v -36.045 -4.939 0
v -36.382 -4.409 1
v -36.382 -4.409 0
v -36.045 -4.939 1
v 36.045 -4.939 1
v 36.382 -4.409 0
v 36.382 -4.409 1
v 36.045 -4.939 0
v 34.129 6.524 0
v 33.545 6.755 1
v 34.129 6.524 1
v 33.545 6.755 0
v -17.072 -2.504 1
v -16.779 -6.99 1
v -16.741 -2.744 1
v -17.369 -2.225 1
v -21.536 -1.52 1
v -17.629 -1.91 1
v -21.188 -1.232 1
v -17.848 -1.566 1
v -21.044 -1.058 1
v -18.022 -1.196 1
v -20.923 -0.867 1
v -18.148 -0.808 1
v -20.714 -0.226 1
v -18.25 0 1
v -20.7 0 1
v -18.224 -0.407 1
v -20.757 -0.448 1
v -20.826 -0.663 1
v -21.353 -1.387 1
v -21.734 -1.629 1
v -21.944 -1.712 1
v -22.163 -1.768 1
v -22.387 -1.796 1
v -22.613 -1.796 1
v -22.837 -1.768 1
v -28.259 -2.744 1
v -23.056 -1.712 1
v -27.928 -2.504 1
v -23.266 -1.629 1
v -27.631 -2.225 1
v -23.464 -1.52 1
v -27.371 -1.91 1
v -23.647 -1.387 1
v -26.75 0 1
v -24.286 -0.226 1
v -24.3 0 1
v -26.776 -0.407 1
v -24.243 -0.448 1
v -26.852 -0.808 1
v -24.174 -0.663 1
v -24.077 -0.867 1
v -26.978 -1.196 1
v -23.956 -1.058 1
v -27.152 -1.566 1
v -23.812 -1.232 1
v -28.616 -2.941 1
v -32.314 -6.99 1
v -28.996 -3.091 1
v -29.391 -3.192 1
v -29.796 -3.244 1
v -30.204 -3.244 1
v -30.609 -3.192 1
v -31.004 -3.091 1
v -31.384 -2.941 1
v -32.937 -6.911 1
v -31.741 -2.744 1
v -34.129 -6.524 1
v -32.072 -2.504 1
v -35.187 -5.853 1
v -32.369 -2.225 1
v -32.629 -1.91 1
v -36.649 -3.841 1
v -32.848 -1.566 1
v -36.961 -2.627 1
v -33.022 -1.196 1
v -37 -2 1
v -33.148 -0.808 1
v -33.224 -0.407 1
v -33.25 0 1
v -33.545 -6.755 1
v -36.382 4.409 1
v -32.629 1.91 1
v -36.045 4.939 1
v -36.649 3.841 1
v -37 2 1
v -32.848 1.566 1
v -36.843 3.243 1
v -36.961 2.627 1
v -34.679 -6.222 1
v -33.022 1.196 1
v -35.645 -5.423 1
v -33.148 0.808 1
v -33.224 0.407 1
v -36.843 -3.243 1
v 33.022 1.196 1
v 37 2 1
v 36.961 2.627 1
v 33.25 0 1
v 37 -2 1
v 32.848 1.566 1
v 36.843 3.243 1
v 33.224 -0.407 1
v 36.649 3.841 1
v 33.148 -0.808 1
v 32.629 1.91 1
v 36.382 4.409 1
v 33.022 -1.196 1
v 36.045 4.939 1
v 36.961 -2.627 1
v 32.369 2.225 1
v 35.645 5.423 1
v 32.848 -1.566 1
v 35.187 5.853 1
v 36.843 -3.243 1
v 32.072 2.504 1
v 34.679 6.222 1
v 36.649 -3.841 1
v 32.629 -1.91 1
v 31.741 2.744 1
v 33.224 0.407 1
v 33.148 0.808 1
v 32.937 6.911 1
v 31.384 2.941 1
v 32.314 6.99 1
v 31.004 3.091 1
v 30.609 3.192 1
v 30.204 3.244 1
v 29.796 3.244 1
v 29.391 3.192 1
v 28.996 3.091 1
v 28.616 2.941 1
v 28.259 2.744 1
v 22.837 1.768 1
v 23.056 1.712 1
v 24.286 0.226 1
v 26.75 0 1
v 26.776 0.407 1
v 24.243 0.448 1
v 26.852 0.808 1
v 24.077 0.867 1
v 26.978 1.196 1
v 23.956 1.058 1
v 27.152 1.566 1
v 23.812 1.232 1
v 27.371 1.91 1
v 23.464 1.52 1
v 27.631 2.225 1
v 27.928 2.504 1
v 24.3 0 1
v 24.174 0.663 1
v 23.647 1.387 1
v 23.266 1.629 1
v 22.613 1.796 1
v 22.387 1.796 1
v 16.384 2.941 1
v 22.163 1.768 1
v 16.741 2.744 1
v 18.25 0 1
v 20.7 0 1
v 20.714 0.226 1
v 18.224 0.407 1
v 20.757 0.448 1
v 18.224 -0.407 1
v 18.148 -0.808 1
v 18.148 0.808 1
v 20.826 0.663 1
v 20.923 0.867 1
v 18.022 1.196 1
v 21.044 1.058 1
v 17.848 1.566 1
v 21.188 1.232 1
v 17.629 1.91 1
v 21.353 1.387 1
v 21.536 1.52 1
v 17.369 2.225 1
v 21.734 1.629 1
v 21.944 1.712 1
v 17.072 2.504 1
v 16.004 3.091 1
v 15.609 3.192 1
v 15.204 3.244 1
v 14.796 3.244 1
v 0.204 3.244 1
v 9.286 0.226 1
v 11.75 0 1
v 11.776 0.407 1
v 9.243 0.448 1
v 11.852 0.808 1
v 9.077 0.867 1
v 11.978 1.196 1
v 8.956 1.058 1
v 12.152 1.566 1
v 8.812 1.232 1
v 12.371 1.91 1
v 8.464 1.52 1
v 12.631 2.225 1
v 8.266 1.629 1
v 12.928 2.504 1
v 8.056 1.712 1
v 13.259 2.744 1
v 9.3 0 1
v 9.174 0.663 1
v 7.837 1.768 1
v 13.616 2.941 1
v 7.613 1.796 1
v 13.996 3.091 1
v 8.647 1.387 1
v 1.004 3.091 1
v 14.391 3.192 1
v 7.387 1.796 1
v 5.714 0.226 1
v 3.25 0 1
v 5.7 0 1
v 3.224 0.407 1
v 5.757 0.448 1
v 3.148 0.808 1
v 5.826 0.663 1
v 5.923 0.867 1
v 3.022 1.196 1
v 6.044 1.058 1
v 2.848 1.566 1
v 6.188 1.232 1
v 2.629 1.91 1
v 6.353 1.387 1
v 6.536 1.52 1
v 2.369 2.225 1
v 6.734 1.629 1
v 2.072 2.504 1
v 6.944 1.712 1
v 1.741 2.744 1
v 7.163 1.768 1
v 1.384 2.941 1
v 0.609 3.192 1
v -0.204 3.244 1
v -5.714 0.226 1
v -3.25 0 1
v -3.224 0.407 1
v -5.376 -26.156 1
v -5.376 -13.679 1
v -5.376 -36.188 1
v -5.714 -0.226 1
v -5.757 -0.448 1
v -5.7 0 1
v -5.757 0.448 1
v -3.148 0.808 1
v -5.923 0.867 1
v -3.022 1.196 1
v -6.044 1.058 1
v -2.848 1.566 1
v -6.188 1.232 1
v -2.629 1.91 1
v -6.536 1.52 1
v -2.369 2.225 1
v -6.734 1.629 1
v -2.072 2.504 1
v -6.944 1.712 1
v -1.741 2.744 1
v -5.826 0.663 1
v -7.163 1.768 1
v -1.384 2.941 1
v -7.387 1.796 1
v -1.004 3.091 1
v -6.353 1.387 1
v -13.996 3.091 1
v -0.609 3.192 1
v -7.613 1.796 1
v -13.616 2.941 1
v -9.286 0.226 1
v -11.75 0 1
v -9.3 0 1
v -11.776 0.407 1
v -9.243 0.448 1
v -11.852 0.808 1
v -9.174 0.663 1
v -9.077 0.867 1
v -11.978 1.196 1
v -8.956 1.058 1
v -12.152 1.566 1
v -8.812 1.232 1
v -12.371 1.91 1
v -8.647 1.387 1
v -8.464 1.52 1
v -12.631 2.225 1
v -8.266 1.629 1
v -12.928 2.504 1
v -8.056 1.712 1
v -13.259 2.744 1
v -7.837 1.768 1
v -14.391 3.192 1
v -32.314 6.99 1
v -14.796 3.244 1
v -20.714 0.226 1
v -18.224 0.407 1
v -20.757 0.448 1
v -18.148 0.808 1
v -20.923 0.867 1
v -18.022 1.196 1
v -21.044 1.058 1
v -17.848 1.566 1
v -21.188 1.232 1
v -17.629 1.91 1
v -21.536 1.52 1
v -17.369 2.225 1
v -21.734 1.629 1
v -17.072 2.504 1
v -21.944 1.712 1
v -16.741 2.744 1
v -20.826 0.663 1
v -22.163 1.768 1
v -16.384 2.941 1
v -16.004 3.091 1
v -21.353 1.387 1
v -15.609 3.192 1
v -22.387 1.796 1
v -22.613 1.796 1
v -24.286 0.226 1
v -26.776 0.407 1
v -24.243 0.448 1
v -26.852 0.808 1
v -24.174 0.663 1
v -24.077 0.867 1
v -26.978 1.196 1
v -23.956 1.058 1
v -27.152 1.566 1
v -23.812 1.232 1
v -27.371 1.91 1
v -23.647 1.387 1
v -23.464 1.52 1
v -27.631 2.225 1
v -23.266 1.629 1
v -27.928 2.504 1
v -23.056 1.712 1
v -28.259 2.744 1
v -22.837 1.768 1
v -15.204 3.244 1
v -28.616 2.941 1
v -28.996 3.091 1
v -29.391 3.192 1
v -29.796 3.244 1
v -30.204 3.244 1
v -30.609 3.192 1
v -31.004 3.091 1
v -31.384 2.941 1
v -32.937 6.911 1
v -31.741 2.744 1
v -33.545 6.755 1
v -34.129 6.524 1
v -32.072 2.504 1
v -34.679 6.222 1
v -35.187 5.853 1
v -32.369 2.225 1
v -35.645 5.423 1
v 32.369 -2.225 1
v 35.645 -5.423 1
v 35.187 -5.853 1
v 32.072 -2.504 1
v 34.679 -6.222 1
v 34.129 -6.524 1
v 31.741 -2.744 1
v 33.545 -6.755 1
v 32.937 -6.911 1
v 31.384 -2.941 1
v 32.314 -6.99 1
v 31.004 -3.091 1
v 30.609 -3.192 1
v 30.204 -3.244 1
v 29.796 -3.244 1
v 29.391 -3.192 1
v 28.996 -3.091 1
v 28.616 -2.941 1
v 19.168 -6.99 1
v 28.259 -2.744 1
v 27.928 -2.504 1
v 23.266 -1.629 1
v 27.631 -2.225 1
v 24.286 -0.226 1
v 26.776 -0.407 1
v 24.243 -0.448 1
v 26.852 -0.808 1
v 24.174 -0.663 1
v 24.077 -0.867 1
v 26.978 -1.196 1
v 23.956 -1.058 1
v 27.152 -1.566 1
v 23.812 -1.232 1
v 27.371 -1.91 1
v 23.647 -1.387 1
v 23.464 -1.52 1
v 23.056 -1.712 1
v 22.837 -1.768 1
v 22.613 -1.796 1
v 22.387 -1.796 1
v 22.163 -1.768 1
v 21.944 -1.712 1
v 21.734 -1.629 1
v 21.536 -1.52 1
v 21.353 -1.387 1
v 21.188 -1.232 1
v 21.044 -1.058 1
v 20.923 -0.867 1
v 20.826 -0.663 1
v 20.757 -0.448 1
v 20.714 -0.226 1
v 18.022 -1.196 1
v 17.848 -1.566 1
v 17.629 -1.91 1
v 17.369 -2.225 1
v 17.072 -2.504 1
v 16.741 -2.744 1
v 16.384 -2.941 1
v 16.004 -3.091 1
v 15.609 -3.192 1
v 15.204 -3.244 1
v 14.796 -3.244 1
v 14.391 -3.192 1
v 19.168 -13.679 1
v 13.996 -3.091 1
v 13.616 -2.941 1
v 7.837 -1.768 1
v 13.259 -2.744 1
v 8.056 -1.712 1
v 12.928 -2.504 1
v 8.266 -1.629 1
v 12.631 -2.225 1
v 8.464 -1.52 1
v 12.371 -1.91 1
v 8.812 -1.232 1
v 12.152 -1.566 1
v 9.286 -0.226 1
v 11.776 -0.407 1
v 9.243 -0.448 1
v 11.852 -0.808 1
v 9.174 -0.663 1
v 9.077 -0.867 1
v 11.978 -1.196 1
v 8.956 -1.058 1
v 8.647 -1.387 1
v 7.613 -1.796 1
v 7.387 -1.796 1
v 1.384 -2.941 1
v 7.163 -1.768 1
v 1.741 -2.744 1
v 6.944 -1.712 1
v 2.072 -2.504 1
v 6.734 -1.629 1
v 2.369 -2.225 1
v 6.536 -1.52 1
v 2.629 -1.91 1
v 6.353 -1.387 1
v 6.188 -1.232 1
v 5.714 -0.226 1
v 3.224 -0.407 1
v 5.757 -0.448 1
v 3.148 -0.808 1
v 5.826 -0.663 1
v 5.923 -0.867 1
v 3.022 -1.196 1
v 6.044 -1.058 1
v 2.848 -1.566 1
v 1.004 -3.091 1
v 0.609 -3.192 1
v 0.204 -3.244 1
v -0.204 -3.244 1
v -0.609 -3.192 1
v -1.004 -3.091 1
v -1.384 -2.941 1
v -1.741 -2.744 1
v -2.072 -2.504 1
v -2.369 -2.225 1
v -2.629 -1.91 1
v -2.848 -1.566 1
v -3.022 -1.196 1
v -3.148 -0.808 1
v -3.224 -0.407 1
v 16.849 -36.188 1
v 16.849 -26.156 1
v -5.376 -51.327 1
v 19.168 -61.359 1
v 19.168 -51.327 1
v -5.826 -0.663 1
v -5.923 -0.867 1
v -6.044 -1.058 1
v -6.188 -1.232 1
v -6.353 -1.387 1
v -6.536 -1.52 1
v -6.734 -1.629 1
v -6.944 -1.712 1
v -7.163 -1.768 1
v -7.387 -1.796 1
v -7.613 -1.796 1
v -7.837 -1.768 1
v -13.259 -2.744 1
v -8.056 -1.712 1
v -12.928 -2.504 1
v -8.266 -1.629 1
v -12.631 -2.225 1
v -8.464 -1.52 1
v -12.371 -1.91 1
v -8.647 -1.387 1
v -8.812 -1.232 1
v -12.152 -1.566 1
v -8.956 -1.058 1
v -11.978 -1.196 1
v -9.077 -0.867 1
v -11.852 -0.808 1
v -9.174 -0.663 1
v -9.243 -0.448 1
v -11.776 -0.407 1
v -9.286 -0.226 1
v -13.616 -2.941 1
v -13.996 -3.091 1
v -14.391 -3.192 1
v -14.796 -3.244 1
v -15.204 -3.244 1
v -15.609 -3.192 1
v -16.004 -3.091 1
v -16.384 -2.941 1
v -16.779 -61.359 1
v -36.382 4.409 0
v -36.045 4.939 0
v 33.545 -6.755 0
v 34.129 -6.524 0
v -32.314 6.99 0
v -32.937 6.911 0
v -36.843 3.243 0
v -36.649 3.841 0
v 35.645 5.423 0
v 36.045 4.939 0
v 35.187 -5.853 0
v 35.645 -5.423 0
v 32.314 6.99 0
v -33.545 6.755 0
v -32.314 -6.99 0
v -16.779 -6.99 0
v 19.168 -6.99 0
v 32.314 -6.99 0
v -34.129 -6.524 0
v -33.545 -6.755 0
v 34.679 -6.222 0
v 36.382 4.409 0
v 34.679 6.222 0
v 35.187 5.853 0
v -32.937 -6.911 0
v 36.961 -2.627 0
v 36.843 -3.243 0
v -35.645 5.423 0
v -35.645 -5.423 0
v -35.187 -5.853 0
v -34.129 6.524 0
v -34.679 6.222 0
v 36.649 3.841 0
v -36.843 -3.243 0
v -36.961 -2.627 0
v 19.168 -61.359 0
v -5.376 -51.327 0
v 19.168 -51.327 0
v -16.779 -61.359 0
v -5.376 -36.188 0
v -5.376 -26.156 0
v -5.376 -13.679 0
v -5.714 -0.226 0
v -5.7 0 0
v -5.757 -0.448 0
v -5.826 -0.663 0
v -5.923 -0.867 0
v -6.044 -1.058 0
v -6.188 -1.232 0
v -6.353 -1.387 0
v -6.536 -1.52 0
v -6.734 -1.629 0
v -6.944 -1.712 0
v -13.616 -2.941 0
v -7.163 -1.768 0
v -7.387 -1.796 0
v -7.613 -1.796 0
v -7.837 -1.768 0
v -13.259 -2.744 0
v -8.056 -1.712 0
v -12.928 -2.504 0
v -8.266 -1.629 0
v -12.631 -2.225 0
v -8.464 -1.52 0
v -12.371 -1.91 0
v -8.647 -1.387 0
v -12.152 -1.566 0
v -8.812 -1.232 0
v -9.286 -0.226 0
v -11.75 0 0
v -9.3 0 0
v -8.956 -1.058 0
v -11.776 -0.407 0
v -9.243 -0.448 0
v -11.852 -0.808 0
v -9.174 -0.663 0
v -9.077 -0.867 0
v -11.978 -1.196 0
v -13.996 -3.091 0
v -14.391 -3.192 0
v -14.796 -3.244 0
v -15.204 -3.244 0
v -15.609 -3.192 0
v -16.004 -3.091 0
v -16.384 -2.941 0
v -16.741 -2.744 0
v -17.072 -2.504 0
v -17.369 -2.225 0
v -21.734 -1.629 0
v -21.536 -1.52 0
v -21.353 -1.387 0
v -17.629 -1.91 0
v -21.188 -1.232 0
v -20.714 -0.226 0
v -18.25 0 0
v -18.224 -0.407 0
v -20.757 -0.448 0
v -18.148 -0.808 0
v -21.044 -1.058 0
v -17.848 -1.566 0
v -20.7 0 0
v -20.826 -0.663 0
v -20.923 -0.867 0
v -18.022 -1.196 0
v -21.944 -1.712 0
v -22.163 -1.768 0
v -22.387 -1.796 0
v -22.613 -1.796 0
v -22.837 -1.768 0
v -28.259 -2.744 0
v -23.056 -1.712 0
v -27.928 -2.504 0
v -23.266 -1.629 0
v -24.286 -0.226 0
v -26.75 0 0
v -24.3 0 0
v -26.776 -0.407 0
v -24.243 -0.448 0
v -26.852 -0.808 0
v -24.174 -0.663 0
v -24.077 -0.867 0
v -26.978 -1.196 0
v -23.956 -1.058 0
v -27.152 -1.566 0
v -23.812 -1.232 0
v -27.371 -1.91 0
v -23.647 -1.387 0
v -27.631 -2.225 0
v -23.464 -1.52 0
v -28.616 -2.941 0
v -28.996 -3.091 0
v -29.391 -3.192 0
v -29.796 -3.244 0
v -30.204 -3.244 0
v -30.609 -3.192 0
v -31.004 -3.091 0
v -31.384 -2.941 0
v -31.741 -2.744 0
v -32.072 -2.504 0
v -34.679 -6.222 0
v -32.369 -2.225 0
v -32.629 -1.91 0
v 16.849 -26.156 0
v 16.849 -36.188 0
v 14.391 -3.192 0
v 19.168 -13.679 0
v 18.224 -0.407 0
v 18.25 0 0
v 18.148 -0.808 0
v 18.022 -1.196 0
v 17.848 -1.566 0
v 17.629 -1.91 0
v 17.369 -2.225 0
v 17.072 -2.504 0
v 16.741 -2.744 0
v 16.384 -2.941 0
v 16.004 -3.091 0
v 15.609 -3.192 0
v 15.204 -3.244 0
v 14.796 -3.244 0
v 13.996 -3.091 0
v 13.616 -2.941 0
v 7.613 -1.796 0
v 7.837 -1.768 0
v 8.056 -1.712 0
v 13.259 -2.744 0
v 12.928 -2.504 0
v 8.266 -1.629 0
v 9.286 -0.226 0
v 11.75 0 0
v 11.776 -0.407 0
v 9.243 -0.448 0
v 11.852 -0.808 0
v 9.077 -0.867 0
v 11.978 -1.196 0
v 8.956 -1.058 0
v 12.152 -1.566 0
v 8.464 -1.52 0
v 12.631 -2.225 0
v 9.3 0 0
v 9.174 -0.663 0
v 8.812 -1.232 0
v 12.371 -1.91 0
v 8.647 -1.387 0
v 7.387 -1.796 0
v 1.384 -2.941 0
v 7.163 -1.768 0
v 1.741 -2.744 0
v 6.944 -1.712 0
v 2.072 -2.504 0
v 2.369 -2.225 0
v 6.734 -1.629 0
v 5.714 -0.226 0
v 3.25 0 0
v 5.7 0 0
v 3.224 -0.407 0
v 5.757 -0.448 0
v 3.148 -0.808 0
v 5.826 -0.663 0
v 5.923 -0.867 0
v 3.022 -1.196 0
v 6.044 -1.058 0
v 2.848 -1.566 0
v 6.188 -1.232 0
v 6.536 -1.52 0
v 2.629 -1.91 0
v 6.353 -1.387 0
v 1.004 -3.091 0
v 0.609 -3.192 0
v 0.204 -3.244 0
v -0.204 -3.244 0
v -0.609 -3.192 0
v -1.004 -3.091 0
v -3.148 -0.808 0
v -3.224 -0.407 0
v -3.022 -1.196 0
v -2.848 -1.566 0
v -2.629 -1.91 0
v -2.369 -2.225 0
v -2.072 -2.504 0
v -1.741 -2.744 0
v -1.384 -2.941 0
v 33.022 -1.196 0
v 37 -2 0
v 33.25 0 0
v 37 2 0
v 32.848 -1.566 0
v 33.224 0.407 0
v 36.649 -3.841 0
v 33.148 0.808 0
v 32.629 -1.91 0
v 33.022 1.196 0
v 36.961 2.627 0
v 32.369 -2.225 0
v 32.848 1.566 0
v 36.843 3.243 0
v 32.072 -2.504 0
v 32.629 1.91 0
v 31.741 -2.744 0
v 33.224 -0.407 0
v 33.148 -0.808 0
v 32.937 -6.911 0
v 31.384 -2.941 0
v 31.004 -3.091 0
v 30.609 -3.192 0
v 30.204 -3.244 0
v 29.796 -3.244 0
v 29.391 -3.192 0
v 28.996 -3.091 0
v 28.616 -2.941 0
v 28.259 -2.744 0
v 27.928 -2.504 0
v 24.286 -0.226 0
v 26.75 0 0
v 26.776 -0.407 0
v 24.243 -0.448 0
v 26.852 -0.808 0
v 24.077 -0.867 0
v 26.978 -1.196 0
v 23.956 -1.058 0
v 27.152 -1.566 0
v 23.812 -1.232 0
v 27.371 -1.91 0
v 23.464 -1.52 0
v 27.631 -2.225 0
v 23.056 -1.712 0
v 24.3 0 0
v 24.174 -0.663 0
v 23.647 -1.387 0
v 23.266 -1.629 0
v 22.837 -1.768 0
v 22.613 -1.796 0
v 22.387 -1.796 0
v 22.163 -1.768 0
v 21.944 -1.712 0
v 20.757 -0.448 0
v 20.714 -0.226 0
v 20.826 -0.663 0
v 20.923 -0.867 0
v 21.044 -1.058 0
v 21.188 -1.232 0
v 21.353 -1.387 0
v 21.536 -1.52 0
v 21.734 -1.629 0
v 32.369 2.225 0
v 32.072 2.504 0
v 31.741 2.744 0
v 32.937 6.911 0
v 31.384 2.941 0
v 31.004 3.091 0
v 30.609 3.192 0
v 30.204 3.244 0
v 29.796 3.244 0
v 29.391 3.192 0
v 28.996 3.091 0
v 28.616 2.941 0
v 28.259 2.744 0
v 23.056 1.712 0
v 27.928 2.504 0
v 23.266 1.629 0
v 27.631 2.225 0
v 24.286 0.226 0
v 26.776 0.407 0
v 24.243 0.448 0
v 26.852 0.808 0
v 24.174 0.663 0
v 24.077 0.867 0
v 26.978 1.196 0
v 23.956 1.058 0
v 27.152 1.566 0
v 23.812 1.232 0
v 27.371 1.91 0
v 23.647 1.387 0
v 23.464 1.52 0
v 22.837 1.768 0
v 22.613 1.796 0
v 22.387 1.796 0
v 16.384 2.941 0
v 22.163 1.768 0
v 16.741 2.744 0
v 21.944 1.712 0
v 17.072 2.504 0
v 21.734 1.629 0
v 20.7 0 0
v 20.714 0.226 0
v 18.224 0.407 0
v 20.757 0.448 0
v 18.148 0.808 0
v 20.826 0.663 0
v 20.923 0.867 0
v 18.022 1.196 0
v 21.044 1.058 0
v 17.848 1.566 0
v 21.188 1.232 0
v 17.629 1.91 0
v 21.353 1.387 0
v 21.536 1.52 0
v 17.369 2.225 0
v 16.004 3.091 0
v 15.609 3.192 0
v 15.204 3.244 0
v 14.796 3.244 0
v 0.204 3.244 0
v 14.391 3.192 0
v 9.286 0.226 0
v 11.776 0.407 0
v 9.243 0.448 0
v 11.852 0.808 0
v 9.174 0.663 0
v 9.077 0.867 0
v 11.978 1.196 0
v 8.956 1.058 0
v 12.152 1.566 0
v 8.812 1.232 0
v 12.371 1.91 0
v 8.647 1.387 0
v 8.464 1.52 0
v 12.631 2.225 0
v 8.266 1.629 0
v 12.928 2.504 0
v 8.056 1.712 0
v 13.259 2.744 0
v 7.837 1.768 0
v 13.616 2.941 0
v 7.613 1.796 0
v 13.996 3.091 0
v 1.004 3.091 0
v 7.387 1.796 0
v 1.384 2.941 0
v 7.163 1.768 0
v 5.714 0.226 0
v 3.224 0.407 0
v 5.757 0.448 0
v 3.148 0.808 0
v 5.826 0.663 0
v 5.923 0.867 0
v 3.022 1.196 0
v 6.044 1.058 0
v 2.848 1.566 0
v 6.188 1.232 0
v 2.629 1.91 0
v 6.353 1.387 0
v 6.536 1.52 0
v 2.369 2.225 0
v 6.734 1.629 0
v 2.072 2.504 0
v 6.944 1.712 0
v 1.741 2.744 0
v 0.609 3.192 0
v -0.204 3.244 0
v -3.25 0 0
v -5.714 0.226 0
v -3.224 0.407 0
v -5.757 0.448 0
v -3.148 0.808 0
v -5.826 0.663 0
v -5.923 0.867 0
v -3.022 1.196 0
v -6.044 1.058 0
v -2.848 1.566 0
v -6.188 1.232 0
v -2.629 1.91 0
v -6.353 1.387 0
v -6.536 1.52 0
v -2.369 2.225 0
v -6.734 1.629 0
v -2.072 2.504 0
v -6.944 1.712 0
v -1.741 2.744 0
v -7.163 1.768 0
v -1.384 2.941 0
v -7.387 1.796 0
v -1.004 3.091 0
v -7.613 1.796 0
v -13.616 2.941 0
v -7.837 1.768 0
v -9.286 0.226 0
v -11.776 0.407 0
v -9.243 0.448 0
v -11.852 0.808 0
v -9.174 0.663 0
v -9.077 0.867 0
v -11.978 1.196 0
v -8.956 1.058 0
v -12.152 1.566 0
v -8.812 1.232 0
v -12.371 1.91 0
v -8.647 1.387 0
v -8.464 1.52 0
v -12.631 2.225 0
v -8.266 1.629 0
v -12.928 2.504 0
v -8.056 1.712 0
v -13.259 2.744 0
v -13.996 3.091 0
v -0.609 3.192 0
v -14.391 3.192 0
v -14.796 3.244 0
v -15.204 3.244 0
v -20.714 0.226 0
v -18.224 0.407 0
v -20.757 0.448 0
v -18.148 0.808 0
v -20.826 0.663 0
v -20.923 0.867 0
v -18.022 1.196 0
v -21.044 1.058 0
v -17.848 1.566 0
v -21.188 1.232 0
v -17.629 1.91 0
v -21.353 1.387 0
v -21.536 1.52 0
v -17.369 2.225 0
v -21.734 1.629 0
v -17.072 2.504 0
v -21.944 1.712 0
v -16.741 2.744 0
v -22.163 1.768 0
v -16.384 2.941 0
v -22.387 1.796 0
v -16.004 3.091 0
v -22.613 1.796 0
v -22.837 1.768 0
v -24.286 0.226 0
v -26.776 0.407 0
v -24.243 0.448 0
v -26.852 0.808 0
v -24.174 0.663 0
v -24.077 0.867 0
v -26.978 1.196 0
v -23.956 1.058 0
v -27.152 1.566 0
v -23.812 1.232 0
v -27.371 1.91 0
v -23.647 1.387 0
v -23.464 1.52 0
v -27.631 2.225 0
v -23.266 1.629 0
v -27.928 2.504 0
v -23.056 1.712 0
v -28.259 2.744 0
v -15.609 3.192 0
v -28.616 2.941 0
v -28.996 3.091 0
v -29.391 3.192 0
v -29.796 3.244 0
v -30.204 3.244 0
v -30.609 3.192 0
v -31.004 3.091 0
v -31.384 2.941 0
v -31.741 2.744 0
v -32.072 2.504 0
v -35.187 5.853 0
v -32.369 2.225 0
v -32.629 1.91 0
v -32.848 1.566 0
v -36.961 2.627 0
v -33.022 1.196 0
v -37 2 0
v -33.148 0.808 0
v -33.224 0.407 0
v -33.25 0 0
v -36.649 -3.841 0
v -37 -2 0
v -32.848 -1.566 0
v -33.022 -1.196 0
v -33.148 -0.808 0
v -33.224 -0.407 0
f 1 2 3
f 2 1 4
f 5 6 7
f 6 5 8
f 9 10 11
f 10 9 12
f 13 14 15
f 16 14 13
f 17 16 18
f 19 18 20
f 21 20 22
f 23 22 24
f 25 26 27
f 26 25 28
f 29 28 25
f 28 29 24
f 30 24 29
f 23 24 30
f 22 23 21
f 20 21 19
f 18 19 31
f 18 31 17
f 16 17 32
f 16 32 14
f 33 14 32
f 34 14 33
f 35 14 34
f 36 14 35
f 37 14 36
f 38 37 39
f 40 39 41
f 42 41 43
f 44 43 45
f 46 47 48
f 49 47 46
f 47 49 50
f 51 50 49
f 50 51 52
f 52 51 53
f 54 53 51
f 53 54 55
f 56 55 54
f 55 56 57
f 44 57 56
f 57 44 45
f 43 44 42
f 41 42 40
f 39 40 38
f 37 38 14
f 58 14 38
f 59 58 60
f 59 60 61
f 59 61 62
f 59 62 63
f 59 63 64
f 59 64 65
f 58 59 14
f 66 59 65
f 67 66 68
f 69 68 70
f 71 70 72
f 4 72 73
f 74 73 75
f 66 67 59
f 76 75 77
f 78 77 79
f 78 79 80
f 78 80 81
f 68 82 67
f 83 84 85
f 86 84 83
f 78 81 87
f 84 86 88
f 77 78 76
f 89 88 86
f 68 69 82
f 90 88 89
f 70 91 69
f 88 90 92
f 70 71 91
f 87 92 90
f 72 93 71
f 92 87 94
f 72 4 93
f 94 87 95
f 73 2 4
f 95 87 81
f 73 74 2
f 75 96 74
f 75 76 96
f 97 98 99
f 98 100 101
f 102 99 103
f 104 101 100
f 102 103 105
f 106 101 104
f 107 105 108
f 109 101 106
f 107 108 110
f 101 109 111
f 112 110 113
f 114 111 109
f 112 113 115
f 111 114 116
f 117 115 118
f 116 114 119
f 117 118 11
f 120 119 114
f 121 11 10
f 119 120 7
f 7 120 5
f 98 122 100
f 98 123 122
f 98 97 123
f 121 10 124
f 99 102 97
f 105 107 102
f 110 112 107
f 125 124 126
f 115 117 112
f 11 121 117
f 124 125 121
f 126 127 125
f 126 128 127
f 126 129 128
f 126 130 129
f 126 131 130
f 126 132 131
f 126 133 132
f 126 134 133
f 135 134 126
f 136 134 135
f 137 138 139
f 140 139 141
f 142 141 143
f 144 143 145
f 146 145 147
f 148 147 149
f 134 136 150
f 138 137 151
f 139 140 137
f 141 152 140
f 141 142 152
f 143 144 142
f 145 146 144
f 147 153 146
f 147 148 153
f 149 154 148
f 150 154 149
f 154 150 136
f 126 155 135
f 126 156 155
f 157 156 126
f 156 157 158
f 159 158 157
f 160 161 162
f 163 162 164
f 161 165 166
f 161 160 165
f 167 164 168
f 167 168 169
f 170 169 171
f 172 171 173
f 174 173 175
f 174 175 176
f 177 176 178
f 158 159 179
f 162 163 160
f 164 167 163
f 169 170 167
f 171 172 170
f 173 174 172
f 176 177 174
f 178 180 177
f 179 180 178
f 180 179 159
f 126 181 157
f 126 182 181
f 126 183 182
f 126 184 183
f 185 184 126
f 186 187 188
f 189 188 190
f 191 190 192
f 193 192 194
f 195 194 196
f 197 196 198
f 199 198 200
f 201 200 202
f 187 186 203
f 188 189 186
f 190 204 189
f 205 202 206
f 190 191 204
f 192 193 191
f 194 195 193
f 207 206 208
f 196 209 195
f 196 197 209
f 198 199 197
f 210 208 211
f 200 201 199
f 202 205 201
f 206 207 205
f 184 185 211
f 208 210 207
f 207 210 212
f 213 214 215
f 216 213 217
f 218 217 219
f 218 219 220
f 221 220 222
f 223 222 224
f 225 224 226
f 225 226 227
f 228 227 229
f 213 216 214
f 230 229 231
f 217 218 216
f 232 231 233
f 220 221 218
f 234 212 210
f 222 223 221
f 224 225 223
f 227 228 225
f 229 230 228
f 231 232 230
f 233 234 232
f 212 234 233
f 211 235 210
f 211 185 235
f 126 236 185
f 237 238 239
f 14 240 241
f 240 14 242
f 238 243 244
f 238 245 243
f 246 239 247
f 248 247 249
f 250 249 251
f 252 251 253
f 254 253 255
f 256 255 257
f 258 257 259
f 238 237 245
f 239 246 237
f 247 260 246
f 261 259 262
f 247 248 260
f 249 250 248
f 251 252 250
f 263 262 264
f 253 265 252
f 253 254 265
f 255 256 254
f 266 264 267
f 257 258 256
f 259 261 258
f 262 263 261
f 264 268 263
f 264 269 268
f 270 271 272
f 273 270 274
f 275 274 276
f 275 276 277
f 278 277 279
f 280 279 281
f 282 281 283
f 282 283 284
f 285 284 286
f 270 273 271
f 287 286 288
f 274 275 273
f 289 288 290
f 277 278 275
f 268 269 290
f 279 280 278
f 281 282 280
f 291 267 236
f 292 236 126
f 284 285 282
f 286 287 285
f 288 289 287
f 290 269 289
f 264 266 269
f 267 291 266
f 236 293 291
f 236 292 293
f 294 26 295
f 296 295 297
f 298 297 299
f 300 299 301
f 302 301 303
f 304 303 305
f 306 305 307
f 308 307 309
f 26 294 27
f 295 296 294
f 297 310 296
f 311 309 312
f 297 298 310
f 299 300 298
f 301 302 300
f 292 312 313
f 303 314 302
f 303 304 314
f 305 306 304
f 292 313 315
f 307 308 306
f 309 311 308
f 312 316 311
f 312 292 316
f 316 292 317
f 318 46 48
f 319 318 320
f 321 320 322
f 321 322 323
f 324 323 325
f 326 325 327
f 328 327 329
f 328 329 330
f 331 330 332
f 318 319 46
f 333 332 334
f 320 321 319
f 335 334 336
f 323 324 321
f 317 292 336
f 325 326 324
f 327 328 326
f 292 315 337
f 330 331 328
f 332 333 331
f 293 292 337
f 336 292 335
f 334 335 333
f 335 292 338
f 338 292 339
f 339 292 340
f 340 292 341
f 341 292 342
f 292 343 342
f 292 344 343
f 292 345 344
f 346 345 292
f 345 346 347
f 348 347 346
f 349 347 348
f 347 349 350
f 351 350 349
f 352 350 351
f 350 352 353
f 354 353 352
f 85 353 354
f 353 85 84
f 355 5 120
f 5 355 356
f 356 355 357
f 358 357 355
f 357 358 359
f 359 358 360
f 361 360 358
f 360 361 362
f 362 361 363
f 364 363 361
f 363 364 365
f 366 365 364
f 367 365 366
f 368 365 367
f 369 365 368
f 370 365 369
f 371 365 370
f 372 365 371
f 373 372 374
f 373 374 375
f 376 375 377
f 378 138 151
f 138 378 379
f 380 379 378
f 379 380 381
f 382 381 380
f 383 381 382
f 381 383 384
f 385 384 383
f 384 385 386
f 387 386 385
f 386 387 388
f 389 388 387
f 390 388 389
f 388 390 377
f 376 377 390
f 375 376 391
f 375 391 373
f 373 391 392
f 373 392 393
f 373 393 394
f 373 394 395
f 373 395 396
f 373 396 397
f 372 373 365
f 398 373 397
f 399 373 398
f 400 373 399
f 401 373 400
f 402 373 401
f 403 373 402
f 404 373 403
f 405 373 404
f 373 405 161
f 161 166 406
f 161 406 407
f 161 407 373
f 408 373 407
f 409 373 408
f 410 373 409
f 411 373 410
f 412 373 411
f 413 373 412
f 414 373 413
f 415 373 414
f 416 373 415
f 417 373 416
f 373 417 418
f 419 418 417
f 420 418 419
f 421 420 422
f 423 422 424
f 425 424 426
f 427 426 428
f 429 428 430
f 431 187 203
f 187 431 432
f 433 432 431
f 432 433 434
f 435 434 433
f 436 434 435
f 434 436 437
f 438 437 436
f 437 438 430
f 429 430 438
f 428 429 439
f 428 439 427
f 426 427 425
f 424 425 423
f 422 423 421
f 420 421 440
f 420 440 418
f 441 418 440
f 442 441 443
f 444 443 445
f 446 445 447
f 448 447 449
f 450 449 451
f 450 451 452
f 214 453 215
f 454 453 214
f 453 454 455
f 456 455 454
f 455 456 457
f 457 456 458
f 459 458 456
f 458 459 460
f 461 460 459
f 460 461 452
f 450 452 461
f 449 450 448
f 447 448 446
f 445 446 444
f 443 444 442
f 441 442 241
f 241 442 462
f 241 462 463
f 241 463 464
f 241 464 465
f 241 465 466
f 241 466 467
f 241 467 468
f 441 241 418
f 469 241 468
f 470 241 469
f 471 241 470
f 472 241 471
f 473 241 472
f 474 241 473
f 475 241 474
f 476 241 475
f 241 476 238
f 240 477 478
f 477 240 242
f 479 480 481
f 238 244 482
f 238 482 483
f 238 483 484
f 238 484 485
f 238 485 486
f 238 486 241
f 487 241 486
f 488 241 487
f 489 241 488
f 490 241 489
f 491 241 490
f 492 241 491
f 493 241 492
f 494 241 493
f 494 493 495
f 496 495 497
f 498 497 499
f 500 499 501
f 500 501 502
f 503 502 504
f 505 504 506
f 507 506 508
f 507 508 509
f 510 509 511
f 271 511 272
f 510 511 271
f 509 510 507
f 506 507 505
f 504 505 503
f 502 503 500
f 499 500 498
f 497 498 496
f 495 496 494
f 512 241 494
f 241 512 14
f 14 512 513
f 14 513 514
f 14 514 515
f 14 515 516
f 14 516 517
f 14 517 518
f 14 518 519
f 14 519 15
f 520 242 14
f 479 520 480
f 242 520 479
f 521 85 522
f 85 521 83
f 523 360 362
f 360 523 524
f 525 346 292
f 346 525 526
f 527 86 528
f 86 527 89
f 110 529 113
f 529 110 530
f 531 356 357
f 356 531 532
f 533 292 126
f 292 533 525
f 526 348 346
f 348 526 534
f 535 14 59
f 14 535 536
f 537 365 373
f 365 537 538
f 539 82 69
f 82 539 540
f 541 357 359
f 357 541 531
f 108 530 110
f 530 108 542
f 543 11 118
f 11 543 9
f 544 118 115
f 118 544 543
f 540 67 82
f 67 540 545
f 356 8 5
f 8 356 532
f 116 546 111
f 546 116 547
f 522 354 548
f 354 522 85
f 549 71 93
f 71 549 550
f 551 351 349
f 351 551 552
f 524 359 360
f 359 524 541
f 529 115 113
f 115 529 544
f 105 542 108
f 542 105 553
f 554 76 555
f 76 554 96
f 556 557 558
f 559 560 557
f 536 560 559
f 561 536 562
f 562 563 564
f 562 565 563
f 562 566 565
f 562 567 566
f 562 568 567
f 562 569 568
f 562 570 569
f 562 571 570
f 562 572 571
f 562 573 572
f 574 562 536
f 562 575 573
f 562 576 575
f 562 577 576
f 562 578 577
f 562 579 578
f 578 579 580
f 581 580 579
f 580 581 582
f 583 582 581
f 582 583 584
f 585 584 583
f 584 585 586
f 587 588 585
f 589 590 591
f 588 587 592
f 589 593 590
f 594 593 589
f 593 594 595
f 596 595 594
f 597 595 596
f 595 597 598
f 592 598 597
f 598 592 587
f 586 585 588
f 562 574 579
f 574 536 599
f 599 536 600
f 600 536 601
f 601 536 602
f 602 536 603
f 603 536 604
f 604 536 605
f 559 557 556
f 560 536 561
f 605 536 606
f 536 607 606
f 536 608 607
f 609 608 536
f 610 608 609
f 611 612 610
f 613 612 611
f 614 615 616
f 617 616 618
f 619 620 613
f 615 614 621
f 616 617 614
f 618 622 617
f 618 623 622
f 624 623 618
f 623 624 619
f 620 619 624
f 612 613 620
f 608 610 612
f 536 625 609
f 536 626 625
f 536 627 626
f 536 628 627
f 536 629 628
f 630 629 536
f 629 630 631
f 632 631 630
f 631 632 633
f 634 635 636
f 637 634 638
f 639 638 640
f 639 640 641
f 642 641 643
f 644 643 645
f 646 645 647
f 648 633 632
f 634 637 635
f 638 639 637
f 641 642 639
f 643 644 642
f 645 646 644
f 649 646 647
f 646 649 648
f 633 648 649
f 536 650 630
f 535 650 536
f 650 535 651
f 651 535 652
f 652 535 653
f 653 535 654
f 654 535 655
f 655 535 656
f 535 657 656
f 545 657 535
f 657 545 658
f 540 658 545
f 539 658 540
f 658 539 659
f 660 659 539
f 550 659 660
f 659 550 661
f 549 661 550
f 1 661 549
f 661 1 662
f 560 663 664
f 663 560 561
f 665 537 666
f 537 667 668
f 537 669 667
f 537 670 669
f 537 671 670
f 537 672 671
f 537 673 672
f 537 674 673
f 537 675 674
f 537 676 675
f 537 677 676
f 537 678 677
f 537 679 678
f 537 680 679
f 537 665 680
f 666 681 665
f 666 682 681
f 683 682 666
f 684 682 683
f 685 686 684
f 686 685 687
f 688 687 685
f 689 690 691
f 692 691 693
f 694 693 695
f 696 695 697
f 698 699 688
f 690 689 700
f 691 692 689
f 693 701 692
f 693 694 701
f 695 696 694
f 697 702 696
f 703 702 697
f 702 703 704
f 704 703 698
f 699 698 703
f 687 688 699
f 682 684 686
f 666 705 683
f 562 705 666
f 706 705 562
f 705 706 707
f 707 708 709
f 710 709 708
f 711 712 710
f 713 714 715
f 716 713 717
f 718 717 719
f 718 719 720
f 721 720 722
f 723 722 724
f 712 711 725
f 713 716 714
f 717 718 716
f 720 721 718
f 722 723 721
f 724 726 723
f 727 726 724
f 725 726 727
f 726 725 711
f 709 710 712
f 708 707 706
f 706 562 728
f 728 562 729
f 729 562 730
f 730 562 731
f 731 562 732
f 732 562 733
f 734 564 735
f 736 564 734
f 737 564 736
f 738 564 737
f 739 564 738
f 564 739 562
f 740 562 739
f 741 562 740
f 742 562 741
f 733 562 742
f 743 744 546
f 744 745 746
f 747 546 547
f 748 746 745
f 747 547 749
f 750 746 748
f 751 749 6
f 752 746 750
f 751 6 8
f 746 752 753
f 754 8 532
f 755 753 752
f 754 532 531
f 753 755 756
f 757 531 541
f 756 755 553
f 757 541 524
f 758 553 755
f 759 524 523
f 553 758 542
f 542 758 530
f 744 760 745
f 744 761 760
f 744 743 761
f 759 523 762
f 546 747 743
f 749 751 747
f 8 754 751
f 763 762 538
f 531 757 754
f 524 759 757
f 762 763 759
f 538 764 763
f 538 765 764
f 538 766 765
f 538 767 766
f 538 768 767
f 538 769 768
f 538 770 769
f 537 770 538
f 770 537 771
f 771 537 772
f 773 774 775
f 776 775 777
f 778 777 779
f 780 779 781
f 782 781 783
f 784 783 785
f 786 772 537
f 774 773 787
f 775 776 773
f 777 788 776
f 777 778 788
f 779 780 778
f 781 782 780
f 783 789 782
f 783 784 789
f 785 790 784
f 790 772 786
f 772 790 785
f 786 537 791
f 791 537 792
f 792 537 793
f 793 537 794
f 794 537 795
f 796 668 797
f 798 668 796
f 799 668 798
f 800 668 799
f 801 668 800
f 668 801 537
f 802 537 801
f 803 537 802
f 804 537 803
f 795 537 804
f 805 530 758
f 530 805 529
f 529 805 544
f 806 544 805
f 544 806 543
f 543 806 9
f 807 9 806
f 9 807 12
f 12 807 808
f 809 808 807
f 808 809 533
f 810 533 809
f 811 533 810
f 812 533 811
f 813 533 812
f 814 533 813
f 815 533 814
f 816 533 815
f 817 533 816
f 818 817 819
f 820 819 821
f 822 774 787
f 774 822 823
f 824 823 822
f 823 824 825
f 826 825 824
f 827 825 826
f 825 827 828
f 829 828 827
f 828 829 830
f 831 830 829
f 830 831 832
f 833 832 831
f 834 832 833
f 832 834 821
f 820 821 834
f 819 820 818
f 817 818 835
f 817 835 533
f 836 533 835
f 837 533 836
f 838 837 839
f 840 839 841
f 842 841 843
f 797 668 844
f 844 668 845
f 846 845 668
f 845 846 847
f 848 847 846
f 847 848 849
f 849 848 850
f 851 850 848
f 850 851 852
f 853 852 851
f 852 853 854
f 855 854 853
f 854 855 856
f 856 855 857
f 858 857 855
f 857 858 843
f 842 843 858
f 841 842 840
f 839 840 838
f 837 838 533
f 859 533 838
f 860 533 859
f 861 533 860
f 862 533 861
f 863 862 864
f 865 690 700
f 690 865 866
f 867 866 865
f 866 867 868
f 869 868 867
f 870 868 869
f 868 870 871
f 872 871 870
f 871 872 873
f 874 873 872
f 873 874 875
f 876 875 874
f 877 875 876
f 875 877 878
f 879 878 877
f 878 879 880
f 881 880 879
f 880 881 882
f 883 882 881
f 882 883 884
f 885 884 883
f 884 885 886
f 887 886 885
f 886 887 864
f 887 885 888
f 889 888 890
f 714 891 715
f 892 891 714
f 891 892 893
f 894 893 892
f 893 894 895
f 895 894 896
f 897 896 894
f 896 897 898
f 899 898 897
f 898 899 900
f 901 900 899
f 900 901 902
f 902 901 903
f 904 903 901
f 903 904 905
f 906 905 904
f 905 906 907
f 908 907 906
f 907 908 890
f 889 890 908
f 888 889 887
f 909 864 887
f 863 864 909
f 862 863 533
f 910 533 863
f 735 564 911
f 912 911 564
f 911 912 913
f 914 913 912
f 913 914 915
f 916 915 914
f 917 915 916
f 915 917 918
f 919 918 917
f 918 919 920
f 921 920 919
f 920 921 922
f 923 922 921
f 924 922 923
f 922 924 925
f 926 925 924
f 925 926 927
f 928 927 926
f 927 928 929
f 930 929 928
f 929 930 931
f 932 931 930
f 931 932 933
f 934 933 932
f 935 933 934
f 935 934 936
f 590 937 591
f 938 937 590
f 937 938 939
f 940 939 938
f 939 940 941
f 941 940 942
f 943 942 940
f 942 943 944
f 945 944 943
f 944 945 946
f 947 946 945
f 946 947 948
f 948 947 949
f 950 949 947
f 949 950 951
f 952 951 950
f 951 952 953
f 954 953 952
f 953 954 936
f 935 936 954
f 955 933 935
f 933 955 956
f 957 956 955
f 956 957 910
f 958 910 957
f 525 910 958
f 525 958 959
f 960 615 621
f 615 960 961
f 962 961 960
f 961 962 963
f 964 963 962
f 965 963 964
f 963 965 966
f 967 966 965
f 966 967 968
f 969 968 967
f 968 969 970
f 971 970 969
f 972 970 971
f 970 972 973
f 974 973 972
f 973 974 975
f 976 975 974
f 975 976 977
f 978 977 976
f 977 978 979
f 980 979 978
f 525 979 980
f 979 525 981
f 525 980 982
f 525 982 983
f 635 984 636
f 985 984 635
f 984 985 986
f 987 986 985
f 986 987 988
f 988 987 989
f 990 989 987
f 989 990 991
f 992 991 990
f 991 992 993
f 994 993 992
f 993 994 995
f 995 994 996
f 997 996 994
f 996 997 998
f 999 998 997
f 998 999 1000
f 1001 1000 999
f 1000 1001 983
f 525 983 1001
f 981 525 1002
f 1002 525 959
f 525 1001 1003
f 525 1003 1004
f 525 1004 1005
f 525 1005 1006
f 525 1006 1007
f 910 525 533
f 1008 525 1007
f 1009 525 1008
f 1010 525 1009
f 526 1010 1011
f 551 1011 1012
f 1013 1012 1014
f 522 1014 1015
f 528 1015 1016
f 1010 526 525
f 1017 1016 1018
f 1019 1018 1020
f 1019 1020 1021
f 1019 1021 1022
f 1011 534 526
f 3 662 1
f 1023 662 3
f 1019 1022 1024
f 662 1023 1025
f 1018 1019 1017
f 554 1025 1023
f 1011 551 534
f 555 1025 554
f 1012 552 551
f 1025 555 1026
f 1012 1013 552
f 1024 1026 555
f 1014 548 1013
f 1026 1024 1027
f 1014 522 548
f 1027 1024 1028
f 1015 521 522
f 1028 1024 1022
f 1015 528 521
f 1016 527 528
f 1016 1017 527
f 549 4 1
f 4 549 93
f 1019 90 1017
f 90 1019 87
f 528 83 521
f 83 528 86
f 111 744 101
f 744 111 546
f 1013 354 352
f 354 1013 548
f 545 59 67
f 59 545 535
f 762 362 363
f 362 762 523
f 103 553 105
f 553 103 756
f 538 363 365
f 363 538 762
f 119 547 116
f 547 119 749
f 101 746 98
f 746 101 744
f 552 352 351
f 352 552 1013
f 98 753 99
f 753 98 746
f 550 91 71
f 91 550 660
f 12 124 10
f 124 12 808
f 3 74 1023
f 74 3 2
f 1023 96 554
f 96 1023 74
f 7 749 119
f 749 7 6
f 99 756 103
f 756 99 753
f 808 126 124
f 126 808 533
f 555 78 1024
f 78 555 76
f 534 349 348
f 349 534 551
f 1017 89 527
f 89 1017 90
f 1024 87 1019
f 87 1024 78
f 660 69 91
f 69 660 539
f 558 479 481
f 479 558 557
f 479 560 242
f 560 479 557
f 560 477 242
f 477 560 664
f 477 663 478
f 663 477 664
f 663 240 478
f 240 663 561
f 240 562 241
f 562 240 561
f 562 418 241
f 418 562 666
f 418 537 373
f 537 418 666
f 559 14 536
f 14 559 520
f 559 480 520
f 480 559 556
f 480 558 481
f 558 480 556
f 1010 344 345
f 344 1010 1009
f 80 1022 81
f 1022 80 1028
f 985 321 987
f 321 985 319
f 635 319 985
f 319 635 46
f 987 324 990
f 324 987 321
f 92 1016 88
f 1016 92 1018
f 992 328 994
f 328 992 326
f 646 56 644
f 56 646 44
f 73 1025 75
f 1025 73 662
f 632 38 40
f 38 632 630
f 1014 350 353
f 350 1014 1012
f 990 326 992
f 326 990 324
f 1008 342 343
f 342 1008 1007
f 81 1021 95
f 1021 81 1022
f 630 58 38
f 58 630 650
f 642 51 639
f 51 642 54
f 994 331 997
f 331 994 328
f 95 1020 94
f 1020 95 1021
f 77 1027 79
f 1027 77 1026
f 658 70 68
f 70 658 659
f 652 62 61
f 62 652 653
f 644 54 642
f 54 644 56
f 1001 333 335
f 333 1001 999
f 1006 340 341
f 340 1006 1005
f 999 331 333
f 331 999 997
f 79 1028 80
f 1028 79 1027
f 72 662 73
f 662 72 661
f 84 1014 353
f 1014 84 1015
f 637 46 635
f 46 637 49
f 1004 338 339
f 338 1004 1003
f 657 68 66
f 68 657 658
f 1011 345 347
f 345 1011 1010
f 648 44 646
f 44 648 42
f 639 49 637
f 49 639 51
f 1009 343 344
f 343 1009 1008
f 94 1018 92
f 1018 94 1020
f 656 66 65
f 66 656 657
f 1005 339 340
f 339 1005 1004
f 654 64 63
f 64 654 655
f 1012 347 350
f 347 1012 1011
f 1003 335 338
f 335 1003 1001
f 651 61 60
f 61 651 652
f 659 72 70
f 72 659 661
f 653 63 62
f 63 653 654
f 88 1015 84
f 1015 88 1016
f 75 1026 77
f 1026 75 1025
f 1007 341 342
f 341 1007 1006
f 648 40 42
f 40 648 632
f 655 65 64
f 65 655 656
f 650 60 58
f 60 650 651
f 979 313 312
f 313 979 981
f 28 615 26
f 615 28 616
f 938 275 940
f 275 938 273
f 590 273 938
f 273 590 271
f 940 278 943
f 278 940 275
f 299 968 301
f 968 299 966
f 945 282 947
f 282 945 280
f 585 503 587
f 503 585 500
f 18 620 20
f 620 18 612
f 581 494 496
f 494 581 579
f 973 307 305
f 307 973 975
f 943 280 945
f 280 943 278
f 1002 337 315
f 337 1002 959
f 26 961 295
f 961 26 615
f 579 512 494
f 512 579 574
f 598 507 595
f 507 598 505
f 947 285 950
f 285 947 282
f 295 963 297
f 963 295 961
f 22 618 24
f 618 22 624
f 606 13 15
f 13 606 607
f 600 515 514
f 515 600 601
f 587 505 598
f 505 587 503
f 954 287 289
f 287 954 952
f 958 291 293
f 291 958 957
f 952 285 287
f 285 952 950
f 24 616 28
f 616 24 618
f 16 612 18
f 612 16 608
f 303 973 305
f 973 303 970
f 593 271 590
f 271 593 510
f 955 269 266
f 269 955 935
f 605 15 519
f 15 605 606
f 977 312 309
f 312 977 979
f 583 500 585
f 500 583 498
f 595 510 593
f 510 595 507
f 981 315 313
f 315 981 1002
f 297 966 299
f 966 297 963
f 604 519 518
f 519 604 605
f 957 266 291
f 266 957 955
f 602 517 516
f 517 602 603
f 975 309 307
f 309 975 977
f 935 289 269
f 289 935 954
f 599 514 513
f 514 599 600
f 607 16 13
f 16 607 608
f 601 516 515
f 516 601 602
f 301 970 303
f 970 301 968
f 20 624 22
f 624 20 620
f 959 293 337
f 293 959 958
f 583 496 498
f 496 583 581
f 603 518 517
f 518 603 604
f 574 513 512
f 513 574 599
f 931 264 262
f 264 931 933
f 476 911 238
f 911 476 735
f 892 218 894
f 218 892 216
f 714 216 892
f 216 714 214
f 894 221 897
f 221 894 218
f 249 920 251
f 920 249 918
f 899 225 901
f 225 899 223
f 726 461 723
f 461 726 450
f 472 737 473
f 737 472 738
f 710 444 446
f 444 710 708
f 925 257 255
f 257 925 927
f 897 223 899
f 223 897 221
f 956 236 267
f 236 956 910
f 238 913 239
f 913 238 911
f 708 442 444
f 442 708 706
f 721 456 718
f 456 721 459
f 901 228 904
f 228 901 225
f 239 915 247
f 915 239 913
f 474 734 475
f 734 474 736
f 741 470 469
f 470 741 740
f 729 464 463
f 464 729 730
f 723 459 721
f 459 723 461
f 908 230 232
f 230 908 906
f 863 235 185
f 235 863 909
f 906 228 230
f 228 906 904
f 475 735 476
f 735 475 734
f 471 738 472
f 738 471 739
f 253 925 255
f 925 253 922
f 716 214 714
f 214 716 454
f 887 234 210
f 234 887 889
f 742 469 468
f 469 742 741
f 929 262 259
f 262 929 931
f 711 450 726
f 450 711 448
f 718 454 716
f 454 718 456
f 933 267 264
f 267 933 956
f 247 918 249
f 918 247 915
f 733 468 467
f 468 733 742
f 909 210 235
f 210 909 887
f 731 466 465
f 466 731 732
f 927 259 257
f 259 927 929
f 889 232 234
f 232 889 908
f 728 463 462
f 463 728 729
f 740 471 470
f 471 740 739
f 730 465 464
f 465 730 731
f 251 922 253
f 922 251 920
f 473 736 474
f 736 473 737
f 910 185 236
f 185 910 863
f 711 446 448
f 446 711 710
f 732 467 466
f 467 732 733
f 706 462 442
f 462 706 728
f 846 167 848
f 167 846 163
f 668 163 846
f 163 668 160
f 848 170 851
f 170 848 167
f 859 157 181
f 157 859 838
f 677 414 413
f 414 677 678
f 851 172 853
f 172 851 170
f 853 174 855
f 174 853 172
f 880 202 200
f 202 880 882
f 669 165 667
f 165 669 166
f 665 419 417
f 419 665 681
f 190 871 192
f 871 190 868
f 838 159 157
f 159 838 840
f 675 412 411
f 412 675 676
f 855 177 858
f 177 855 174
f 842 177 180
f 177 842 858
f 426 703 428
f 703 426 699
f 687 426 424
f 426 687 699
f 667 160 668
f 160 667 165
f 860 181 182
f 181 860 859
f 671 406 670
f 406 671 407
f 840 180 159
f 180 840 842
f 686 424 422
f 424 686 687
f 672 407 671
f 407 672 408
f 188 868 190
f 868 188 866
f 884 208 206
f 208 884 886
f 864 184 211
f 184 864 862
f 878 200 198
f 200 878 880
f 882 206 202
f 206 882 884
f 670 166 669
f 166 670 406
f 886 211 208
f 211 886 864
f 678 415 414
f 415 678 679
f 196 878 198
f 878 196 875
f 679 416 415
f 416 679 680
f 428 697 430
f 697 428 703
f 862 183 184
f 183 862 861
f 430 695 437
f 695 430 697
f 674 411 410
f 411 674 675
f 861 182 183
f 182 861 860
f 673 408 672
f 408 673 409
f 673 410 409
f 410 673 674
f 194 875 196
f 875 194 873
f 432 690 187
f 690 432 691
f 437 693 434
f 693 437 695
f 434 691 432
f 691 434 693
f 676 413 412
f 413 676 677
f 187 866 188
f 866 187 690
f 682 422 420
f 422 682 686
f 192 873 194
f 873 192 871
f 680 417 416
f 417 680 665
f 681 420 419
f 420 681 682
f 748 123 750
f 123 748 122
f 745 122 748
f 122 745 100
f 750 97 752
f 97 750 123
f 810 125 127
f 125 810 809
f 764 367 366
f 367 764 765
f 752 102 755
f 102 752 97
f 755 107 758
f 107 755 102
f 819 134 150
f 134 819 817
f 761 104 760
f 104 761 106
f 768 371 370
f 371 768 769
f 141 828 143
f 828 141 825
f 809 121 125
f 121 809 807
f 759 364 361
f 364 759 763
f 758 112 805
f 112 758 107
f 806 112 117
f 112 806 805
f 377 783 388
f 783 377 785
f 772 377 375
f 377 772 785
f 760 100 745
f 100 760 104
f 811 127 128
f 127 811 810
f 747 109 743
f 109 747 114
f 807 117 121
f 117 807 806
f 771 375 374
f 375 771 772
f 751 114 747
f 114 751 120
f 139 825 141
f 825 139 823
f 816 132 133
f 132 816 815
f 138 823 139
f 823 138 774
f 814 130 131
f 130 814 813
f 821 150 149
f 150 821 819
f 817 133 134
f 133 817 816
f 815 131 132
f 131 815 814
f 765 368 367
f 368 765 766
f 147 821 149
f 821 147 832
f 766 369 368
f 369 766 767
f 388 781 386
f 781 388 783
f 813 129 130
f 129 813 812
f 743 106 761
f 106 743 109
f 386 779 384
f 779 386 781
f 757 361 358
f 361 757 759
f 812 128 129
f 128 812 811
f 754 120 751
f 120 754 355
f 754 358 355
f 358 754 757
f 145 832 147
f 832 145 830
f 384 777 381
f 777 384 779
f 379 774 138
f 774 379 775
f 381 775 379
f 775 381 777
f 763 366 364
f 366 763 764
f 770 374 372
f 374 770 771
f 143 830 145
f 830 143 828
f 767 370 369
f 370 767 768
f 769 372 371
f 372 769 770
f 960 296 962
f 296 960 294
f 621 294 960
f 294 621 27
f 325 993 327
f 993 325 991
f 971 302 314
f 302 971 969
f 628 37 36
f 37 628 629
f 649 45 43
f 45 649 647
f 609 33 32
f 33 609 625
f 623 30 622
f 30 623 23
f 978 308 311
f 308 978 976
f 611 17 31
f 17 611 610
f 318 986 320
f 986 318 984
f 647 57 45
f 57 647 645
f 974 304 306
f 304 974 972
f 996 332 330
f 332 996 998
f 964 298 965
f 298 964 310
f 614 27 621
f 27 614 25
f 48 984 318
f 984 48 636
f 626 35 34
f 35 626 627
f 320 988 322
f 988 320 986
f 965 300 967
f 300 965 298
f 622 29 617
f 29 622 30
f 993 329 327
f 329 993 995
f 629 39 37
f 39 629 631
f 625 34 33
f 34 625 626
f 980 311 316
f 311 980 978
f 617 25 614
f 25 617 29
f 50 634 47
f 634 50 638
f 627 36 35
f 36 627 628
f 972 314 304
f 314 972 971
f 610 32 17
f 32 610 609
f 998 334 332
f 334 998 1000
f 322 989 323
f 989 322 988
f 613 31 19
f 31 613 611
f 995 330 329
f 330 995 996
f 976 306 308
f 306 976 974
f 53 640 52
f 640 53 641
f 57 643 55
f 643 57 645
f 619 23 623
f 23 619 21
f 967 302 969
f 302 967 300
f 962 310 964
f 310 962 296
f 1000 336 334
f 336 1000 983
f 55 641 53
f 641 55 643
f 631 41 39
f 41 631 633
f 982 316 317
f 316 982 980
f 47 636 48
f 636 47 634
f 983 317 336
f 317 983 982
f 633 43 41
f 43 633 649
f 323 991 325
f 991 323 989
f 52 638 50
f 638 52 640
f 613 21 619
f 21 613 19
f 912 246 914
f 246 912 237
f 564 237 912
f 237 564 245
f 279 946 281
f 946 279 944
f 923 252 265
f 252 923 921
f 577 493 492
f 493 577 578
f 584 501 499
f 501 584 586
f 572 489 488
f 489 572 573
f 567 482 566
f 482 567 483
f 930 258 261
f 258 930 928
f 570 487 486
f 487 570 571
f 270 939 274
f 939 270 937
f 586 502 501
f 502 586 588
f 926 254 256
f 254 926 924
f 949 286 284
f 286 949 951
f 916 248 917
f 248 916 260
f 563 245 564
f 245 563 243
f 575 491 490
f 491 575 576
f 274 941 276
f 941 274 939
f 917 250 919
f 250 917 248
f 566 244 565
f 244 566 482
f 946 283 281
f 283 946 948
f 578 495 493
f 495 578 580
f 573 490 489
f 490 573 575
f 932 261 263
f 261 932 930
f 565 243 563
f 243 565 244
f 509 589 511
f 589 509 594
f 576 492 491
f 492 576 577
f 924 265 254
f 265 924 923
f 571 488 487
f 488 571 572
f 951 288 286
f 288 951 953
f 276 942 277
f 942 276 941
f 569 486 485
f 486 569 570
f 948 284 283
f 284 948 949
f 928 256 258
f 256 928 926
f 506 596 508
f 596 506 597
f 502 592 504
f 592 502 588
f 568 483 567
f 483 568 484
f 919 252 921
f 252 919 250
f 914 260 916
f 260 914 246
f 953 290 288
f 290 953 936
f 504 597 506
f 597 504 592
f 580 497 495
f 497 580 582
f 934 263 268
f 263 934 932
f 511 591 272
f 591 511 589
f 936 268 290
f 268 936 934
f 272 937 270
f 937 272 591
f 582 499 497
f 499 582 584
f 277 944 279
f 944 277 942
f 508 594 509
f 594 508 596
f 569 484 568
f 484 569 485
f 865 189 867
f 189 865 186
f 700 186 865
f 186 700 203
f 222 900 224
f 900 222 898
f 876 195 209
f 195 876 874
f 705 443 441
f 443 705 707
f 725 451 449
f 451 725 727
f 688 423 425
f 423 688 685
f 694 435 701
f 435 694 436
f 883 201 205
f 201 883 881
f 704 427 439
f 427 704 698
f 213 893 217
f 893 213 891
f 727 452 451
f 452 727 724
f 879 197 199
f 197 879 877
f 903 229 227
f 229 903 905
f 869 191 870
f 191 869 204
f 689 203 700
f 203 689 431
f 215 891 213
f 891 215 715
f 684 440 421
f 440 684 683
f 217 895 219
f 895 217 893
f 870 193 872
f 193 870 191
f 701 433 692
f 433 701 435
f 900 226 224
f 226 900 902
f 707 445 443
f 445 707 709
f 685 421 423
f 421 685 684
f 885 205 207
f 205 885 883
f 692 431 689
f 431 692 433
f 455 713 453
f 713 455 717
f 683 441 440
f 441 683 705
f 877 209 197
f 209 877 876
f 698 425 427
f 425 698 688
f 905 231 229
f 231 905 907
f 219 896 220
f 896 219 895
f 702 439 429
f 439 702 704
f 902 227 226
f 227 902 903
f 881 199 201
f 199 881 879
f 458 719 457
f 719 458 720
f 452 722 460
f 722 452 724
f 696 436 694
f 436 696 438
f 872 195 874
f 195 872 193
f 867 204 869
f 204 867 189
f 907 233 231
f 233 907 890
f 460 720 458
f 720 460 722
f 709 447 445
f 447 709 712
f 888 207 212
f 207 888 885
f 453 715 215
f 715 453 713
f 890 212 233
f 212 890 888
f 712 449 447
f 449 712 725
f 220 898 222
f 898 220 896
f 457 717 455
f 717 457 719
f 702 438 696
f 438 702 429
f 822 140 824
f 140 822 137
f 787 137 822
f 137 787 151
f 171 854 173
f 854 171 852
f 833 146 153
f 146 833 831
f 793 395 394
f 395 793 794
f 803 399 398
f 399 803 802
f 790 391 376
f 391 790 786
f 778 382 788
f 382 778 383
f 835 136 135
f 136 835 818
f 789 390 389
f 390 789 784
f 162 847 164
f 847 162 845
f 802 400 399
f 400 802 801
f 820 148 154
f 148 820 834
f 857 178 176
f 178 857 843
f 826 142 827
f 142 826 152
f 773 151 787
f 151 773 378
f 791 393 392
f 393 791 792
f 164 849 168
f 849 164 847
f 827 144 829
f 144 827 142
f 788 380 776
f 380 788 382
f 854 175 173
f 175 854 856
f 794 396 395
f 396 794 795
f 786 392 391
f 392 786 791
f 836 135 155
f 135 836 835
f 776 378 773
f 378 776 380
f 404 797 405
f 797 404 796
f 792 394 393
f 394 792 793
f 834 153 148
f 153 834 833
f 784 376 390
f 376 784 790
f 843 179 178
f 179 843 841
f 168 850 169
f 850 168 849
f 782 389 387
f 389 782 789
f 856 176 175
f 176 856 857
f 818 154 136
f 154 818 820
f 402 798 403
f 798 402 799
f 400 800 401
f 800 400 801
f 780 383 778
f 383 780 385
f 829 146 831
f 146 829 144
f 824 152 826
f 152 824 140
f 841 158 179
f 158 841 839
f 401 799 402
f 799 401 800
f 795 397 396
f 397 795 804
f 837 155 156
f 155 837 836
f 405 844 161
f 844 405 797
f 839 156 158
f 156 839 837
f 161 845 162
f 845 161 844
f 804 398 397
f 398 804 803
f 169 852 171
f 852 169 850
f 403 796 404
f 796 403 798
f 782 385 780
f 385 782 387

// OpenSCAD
$fn = 50;


difference() {
	union() {
		*color(alpha = 1.0000000000, c = "gray") {
			translate(v = [0, 14, 0]) {
				linear_extrude(height = 1) {
					text(font = "Arial:style=Bold", halign = "center", size = 4.5000000000, text = "COMMENT description oobb_plate_shape_p_type_1_depth_5_width_1_thickness_e_extra_oobb_size", valign = "center");
				}
			}
		}
		hull() {
			translate(v = [-32.0000000000, 2.0000000000, 0]) {
				cylinder(h = 1, r = 5);
			}
			translate(v = [32.0000000000, 2.0000000000, 0]) {
				cylinder(h = 1, r = 5);
			}
			translate(v = [-32.0000000000, -2.0000000000, 0]) {
				cylinder(h = 1, r = 5);
			}
			translate(v = [32.0000000000, -2.0000000000, 0]) {
				cylinder(h = 1, r = 5);
			}
		}
		translate(v = [0, -5, 0]) {
			linear_extrude(height = 1) {
				text(font = "DejaVu Sans Mono:style=Bold", halign = "center", size = 57.0000000000, text = "E", valign = "top");
			}
		}
	}
	union() {
		*color(alpha = 1.0000000000, c = "gray") {
			translate(v = [0, 14, 0]) {
				linear_extrude(height = 1) {
					text(font = "Arial:style=Bold", halign = "center", size = 4.5000000000, text = "COMMENT description oobb_holes_shape_n_type_5_width_1_thickness_e_extra_oobb_size_1_height_'all'_holes_true_both_holes", valign = "center");
				}
			}
		}
		translate(v = [-30.0000000000, 0.0000000000, 0]) {
			translate(v = [0, 0, -50]) {
				cylinder(h = 100, r = 3.2500000000);
			}
		}
		translate(v = [-15.0000000000, 0.0000000000, 0]) {
			translate(v = [0, 0, -50]) {
				cylinder(h = 100, r = 3.2500000000);
			}
		}
		translate(v = [0, 0, -50]) {
			cylinder(h = 100, r = 3.2500000000);
		}
		translate(v = [15.0000000000, 0.0000000000, 0]) {
			translate(v = [0, 0, -50]) {
				cylinder(h = 100, r = 3.2500000000);
			}
		}
		translate(v = [30.0000000000, 0.0000000000, 0]) {
			translate(v = [0, 0, -50]) {
				cylinder(h = 100, r = 3.2500000000);
			}
		}
		translate(v = [-30.0000000000, 0.0000000000, 0]) {
			translate(v = [0, 0, -50]) {
				cylinder(h = 100, r = 1.8000000000);
			}
		}
		translate(v = [-22.5000000000, 0.0000000000, 0]) {
			translate(v = [0, 0, -50]) {
				cylinder(h = 100, r = 1.8000000000);
			}
		}
		translate(v = [-15.0000000000, 0.0000000000, 0]) {
			translate(v = [0, 0, -50]) {
				cylinder(h = 100, r = 1.8000000000);
			}
		}
		translate(v = [-7.5000000000, 0.0000000000, 0]) {
			translate(v = [0, 0, -50]) {
				cylinder(h = 100, r = 1.8000000000);
			}
		}
		translate(v = [0, 0, -50]) {
			cylinder(h = 100, r = 1.8000000000);
		}
		translate(v = [7.5000000000, 0.0000000000, 0]) {
			translate(v = [0, 0, -50]) {
				cylinder(h = 100, r = 1.8000000000);
			}
		}
		translate(v = [15.0000000000, 0.0000000000, 0]) {
			translate(v = [0, 0, -50]) {
				cylinder(h = 100, r = 1.8000000000);
			}
		}
		translate(v = [22.5000000000, 0.0000000000, 0]) {
			translate(v = [0, 0, -50]) {
				cylinder(h = 100, r = 1.8000000000);
			}
		}
		translate(v = [30.0000000000, 0.0000000000, 0]) {
			translate(v = [0, 0, -50]) {
				cylinder(h = 100, r = 1.8000000000);
			}
		}
	}
}
